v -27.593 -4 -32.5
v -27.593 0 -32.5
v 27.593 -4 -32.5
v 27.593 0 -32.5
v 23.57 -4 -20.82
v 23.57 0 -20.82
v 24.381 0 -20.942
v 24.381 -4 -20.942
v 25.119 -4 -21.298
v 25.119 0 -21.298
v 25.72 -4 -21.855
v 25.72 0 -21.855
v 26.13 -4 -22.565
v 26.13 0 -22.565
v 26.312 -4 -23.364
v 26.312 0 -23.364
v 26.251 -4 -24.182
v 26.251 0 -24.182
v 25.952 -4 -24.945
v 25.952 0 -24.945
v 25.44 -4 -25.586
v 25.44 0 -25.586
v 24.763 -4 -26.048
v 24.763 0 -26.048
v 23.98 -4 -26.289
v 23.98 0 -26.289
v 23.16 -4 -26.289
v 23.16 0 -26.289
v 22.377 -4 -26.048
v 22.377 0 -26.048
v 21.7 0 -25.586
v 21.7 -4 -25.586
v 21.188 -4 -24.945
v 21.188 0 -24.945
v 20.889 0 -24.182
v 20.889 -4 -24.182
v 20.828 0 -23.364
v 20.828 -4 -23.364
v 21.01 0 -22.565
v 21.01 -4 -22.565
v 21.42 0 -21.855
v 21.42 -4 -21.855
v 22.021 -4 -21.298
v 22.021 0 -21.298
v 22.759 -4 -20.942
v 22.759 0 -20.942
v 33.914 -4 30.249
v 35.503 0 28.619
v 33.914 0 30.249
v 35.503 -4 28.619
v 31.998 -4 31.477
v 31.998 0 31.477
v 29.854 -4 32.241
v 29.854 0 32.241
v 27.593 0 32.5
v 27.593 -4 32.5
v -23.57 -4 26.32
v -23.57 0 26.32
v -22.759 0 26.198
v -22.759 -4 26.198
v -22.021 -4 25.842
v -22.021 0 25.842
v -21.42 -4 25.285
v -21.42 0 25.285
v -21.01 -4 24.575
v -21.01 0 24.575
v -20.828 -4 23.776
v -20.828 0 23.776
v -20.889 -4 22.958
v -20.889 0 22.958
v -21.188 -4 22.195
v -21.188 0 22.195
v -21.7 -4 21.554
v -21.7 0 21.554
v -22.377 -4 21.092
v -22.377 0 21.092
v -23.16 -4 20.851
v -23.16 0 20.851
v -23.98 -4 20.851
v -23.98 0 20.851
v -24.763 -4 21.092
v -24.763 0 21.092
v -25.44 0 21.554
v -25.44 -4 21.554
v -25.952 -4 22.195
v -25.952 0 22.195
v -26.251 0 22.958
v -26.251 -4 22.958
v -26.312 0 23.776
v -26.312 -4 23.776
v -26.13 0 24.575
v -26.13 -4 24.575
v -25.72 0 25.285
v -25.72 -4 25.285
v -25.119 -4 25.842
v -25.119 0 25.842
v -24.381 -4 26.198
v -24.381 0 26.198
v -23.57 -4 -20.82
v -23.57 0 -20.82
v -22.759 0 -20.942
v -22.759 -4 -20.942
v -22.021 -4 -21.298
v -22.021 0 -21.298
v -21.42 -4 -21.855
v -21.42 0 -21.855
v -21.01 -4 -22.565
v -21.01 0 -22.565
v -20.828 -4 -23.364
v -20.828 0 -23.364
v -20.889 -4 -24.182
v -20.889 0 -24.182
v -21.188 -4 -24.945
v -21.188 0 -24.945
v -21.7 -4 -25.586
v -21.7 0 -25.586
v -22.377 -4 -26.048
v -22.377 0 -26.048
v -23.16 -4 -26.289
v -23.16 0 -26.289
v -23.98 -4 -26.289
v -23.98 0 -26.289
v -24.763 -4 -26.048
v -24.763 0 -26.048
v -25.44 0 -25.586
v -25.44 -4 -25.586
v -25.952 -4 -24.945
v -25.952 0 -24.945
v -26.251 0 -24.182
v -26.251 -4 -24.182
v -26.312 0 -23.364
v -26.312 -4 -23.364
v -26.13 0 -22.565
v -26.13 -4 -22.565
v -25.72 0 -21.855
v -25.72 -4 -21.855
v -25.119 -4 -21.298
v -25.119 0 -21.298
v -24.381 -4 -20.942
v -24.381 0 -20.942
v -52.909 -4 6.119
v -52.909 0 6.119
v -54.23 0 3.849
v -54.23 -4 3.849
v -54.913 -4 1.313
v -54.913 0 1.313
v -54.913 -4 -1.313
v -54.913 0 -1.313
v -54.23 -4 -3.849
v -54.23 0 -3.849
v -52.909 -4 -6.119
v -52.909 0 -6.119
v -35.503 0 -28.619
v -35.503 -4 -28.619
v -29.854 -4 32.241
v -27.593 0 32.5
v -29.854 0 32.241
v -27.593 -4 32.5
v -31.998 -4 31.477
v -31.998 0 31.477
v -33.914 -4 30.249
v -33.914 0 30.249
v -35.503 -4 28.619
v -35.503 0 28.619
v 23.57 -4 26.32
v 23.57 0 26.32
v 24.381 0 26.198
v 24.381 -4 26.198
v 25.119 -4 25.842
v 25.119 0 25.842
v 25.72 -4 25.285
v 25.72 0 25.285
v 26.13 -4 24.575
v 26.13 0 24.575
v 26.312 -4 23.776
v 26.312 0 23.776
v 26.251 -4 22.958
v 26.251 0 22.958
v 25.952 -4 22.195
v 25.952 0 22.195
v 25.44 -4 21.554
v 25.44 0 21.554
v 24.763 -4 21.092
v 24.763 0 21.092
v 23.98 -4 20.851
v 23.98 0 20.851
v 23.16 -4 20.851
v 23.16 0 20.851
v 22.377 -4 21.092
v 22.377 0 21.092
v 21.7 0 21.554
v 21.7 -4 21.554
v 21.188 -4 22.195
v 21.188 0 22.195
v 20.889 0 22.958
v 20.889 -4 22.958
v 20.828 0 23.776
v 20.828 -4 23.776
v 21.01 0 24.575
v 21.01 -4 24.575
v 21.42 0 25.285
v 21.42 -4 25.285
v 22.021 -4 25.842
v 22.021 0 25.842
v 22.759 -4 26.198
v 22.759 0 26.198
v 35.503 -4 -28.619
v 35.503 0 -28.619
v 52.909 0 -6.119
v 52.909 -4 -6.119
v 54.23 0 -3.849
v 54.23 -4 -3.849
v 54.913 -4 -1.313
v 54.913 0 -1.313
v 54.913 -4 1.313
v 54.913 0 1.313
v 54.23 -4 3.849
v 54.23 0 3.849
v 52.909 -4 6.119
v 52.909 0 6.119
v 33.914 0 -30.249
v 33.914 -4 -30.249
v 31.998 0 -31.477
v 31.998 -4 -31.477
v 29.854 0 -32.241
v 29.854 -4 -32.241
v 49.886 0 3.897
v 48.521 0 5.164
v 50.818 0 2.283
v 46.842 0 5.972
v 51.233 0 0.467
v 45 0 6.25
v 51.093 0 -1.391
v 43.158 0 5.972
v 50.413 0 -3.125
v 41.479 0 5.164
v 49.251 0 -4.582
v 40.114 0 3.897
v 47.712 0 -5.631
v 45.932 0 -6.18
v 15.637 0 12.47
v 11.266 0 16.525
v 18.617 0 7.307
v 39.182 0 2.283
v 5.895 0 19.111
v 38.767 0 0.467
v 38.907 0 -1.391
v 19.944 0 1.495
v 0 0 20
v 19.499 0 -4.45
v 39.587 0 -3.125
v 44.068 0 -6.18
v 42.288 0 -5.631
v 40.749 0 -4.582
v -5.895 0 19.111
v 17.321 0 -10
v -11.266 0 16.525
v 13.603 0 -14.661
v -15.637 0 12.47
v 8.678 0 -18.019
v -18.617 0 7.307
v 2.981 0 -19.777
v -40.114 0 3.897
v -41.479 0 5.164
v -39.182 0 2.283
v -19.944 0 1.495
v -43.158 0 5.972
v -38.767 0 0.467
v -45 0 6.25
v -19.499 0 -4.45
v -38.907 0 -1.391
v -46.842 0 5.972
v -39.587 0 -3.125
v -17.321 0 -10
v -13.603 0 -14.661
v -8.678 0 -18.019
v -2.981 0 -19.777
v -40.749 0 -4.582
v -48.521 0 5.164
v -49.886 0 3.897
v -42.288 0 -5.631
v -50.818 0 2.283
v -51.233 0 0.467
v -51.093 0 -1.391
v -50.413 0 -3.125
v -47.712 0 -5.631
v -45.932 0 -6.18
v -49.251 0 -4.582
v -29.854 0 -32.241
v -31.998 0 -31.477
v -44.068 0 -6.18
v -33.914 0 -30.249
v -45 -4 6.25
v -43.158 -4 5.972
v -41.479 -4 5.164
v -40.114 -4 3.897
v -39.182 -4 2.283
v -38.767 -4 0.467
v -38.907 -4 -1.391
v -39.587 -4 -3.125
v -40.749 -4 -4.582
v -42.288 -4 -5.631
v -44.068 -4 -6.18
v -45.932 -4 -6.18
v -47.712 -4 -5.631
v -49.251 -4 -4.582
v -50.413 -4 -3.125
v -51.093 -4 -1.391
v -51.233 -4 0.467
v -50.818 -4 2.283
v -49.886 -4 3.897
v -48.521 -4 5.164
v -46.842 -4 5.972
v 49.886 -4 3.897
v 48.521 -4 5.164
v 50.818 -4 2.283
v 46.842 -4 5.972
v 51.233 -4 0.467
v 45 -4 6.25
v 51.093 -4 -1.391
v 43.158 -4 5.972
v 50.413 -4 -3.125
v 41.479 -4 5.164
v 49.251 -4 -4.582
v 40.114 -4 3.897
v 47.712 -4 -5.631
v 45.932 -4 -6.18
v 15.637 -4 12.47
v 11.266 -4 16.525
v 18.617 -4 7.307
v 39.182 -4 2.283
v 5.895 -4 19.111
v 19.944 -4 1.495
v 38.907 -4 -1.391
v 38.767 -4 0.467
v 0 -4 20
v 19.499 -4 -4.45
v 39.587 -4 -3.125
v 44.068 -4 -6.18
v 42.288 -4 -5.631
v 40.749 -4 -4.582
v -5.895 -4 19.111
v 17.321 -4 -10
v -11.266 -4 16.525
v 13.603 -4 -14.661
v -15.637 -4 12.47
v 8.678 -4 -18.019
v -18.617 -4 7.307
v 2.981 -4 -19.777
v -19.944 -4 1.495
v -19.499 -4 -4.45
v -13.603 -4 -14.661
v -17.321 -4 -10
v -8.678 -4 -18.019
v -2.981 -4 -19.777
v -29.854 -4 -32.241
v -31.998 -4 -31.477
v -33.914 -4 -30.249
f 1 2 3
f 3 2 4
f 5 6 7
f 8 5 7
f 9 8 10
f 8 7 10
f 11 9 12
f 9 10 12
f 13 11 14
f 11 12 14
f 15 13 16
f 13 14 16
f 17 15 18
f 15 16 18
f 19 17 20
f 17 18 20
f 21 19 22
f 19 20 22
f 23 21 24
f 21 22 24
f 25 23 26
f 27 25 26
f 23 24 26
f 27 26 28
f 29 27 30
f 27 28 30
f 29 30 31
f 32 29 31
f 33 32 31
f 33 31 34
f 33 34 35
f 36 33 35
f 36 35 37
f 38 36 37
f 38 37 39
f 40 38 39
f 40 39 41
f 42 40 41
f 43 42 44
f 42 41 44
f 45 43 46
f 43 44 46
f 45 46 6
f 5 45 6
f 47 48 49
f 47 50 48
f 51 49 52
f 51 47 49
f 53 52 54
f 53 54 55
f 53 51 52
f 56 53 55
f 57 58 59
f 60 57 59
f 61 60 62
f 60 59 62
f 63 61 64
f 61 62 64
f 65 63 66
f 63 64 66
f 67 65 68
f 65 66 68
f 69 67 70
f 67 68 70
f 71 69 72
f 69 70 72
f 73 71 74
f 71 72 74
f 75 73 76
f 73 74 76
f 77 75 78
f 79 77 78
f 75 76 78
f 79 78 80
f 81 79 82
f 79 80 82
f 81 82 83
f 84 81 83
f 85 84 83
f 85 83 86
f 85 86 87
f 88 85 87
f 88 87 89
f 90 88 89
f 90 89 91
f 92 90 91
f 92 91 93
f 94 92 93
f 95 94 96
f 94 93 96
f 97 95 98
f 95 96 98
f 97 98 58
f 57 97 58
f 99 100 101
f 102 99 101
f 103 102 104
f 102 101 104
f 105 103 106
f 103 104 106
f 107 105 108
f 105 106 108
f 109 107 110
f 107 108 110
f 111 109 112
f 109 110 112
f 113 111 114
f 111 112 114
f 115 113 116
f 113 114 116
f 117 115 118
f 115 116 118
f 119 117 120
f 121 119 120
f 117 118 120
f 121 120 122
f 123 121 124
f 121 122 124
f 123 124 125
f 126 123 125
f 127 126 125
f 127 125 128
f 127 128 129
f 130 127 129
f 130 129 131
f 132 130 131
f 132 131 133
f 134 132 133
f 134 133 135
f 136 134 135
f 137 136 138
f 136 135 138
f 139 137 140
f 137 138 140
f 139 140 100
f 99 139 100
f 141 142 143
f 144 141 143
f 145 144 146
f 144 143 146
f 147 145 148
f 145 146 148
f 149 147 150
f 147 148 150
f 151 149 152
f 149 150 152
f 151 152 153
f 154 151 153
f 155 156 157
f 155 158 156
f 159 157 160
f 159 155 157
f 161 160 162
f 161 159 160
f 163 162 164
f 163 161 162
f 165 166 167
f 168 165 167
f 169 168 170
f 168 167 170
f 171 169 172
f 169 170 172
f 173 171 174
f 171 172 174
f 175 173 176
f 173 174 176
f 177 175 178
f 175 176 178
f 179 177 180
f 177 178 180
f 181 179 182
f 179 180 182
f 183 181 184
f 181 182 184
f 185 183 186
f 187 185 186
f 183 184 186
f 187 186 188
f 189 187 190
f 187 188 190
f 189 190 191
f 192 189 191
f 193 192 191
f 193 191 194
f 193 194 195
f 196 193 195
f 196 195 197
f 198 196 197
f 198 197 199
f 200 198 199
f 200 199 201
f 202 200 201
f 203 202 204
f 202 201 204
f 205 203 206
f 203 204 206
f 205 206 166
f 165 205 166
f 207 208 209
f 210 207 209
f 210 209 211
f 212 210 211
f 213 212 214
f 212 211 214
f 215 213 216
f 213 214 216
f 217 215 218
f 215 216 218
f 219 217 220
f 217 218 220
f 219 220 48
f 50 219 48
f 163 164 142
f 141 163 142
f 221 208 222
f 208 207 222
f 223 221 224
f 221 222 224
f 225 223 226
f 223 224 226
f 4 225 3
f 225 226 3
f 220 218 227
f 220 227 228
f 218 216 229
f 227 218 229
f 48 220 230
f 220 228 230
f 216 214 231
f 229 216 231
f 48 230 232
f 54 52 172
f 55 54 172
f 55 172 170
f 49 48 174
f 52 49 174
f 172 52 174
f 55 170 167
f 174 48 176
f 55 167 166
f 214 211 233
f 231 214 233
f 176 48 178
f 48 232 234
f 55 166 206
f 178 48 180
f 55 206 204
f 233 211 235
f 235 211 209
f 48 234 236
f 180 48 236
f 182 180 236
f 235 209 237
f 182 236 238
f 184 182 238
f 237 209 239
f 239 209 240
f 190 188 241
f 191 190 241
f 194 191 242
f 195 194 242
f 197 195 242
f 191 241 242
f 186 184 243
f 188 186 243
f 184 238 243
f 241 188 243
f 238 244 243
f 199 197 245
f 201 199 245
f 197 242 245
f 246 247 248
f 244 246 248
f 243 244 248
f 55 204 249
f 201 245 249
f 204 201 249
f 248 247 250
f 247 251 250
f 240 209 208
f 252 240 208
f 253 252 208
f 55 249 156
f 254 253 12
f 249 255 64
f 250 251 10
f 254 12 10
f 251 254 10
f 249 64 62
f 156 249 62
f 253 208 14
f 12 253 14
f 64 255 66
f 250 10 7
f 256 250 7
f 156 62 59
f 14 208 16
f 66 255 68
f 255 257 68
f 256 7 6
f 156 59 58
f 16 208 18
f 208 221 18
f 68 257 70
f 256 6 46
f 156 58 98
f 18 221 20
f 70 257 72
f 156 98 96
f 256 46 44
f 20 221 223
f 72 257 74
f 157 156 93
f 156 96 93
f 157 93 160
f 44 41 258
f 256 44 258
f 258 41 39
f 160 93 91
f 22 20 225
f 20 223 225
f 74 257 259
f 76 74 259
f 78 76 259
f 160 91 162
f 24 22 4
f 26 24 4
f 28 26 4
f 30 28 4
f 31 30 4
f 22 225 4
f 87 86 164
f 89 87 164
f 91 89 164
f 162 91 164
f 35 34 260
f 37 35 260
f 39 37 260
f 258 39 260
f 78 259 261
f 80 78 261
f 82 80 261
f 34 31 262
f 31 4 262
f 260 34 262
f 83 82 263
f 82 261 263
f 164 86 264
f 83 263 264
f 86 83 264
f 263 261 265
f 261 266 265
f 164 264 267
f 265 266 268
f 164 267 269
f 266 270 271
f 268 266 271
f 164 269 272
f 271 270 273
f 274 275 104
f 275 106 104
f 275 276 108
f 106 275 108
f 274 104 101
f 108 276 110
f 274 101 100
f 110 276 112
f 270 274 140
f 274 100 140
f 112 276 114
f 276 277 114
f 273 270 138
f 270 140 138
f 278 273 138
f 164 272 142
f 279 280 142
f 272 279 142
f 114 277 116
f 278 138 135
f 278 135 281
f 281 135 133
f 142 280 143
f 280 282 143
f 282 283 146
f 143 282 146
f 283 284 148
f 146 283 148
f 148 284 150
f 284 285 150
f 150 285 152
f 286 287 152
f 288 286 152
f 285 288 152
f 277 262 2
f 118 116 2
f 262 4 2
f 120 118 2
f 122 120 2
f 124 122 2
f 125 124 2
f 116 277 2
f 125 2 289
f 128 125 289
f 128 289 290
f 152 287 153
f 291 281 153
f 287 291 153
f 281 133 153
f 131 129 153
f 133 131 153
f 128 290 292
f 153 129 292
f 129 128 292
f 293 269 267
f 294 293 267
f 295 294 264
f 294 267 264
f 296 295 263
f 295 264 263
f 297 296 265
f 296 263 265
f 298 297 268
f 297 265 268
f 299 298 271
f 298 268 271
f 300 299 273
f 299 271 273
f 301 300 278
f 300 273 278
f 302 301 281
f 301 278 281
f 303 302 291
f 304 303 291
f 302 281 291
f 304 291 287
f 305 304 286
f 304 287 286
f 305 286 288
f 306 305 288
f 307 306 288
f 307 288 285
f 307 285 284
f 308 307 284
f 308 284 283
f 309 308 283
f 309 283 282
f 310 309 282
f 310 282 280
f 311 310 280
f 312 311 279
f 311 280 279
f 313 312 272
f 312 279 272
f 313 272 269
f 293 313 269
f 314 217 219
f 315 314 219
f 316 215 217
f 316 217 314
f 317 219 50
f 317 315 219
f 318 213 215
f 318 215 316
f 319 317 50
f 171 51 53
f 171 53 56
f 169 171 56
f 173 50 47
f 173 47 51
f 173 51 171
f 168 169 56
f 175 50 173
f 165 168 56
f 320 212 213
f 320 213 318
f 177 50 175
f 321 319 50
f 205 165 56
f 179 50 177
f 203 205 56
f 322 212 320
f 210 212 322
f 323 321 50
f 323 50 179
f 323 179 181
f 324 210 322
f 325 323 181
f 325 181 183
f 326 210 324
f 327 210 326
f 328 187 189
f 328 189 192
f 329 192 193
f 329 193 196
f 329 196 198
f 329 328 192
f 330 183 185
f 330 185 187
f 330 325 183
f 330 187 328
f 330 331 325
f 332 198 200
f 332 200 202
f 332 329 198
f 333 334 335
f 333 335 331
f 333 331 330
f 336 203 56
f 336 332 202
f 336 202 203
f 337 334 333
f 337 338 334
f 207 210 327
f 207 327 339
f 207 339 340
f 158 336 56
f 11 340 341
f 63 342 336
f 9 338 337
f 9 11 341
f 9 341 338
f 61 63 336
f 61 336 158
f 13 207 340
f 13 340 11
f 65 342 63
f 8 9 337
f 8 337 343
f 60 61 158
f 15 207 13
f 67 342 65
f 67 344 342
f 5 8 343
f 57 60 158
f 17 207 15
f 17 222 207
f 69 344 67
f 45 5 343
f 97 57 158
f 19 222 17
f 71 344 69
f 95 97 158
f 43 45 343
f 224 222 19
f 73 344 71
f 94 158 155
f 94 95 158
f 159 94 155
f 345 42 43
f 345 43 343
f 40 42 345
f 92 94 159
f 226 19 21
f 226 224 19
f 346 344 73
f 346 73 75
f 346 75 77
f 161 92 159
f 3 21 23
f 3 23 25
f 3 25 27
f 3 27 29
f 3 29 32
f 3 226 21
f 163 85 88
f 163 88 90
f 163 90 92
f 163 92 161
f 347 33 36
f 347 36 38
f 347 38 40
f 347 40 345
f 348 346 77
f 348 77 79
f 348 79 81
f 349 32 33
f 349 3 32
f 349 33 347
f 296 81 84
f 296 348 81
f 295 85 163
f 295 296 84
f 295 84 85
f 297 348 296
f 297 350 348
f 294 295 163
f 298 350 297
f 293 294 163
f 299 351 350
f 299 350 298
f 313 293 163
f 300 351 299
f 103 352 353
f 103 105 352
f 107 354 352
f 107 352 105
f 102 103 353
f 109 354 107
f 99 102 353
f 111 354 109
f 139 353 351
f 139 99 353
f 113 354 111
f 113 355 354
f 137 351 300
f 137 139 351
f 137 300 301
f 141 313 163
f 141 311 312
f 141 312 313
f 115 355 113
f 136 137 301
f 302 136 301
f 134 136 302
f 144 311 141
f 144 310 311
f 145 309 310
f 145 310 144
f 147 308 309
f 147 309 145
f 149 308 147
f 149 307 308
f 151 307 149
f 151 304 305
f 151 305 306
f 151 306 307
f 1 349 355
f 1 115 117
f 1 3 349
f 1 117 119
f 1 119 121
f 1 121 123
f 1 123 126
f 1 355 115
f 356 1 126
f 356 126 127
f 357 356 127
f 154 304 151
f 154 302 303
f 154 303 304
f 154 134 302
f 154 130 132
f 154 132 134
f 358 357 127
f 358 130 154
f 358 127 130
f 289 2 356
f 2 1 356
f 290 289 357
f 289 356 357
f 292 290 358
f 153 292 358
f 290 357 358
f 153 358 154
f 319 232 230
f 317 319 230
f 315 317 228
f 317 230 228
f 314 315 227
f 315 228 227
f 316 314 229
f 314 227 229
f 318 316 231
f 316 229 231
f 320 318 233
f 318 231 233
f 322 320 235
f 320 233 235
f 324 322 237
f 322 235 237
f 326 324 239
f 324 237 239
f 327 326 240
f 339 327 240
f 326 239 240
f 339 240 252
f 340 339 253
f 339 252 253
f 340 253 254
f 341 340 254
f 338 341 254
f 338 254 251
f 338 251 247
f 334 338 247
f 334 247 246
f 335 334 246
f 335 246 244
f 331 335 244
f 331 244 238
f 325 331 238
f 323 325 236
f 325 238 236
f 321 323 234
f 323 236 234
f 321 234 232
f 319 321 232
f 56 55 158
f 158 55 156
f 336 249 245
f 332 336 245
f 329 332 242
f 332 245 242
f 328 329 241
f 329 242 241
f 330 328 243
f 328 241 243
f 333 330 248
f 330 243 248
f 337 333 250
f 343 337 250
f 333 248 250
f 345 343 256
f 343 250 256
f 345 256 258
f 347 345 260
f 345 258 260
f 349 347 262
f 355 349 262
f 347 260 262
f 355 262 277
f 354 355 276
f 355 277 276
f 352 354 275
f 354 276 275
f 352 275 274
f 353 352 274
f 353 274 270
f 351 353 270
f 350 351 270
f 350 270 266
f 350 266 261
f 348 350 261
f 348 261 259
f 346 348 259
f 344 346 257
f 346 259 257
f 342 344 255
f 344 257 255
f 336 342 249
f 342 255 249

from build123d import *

# Parameters (mm, degrees)
SKETCH1_R          = 20
SKETCH1_R_2        = 2.75
SKETCH1_R_3        = 6.25
BASE_FLANGE1_DEPTH = 4
FILLET1_R          = 10


# Sheet-metal steps are written as plain solids
with BuildPart() as part:
    # Sketch1 → Base-Flange1 (new body)
    with BuildSketch(Plane(origin=(0, 0, 0), x_dir=(1, 0, 0), z_dir=(0, 1, 0))):
        with BuildLine():
            Line((32.5, 32.5), (52.909362517, 6.118985584))
            ThreePointArc((52.909362517, 6.118985584), (55, 0), (52.909362517, -6.118985584))
            Line((52.909362517, -6.118985584), (32.5, -32.5))
            Line((32.5, -32.5), (-32.5, -32.5))
            Line((-32.5, -32.5), (-52.909362517, -6.118985584))
            ThreePointArc((-52.909362517, -6.118985584), (-55, 0), (-52.909362517, 6.118985584))
            Line((-52.909362517, 6.118985584), (-32.5, 32.5))
            Line((-32.5, 32.5), (32.5, 32.5))
        make_face()
        with Locations(Location((0, 0, 0), (0, 0, 270))):
            Circle(SKETCH1_R, mode=Mode.SUBTRACT)
        with Locations(Location((-23.57, 23.57, 0), (0, 0, 270))):
            Circle(SKETCH1_R_2, mode=Mode.SUBTRACT)
        with Locations(Location((23.57, 23.57, 0), (0, 0, 270))):
            Circle(SKETCH1_R_2, mode=Mode.SUBTRACT)
        with Locations(Location((23.57, -23.57, 0), (0, 0, 270))):
            Circle(SKETCH1_R_2, mode=Mode.SUBTRACT)
        with Locations(Location((-23.57, -23.57, 0), (0, 0, 270))):
            Circle(SKETCH1_R_2, mode=Mode.SUBTRACT)
        with Locations(Location((-45, 0, 0), (0, 0, 270))):
            Circle(SKETCH1_R_3, mode=Mode.SUBTRACT)
        with Locations(Location((45, 0, 0), (0, 0, 270))):
            Circle(SKETCH1_R_3, mode=Mode.SUBTRACT)
    extrude(amount=-BASE_FLANGE1_DEPTH)

    # Fillet1
    fillet1_edges = [part.edges().sort_by_distance(p)[0] for p in [
        (32.5, -2, -32.5),
        (32.5, -2, 32.5),
        (-32.5, -2, 32.5),
        (-32.5, -2, -32.5),
    ]]
    fillet(fillet1_edges, radius=FILLET1_R)


solid = part.part
